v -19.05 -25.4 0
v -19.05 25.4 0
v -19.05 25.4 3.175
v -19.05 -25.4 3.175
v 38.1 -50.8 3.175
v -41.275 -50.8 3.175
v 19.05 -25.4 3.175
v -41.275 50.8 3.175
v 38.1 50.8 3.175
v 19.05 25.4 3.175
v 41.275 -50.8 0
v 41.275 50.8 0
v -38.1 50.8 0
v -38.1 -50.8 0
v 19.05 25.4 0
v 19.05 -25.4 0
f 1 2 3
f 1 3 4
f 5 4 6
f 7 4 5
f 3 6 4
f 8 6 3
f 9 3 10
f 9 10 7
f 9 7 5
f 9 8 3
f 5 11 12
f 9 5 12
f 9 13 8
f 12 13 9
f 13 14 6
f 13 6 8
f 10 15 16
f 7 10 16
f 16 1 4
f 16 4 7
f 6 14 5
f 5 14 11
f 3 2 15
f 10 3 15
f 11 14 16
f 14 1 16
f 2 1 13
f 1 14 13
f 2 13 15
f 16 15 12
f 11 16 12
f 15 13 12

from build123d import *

# Parameters (mm, degrees)
F0_W     = 82.55
F0_H     = 101.6
F1_DEPTH = 3.175
F2_SIZE  = 3.17499
F3_W     = 38.1
F3_H     = 50.8
F4_DEPTH = 3.175
F5_SIZE  = 3.17499


# Not quite as in the source:
# - a fillet or chamfer is up to 0.001 mm smaller than in the source, because OpenCascade refuses the exact size


with BuildPart() as f1:
    # F0 (on Top) → F1 (new body)
    with BuildSketch(Plane.XY):
        Rectangle(F0_W, F0_H)
    extrude(amount=F1_DEPTH)

    # F2 (size 3.175 in the source; OpenCascade refuses exactly that, so slightly less here)
    f2_edges = [f1.edges().sort_by_distance(p)[0] for p in [
        (-41.275, 0, 0),
    ]]
    chamfer(f2_edges, length=F2_SIZE)

    # F3 (on face) → F4 (cut)
    with BuildSketch(Plane(origin=(0, 0, 0), x_dir=(1, 0, 0), z_dir=(0, 0, -1))):
        Rectangle(F3_W, F3_H)
    extrude(amount=-F4_DEPTH, mode=Mode.SUBTRACT)

    # F5 (size 3.175 in the source; OpenCascade refuses exactly that, so slightly less here)
    f5_edges = [f1.edges().sort_by_distance(p)[0] for p in [
        (41.275, 0, 3.175),
    ]]
    chamfer(f5_edges, length=F5_SIZE)


solid = f1.part
